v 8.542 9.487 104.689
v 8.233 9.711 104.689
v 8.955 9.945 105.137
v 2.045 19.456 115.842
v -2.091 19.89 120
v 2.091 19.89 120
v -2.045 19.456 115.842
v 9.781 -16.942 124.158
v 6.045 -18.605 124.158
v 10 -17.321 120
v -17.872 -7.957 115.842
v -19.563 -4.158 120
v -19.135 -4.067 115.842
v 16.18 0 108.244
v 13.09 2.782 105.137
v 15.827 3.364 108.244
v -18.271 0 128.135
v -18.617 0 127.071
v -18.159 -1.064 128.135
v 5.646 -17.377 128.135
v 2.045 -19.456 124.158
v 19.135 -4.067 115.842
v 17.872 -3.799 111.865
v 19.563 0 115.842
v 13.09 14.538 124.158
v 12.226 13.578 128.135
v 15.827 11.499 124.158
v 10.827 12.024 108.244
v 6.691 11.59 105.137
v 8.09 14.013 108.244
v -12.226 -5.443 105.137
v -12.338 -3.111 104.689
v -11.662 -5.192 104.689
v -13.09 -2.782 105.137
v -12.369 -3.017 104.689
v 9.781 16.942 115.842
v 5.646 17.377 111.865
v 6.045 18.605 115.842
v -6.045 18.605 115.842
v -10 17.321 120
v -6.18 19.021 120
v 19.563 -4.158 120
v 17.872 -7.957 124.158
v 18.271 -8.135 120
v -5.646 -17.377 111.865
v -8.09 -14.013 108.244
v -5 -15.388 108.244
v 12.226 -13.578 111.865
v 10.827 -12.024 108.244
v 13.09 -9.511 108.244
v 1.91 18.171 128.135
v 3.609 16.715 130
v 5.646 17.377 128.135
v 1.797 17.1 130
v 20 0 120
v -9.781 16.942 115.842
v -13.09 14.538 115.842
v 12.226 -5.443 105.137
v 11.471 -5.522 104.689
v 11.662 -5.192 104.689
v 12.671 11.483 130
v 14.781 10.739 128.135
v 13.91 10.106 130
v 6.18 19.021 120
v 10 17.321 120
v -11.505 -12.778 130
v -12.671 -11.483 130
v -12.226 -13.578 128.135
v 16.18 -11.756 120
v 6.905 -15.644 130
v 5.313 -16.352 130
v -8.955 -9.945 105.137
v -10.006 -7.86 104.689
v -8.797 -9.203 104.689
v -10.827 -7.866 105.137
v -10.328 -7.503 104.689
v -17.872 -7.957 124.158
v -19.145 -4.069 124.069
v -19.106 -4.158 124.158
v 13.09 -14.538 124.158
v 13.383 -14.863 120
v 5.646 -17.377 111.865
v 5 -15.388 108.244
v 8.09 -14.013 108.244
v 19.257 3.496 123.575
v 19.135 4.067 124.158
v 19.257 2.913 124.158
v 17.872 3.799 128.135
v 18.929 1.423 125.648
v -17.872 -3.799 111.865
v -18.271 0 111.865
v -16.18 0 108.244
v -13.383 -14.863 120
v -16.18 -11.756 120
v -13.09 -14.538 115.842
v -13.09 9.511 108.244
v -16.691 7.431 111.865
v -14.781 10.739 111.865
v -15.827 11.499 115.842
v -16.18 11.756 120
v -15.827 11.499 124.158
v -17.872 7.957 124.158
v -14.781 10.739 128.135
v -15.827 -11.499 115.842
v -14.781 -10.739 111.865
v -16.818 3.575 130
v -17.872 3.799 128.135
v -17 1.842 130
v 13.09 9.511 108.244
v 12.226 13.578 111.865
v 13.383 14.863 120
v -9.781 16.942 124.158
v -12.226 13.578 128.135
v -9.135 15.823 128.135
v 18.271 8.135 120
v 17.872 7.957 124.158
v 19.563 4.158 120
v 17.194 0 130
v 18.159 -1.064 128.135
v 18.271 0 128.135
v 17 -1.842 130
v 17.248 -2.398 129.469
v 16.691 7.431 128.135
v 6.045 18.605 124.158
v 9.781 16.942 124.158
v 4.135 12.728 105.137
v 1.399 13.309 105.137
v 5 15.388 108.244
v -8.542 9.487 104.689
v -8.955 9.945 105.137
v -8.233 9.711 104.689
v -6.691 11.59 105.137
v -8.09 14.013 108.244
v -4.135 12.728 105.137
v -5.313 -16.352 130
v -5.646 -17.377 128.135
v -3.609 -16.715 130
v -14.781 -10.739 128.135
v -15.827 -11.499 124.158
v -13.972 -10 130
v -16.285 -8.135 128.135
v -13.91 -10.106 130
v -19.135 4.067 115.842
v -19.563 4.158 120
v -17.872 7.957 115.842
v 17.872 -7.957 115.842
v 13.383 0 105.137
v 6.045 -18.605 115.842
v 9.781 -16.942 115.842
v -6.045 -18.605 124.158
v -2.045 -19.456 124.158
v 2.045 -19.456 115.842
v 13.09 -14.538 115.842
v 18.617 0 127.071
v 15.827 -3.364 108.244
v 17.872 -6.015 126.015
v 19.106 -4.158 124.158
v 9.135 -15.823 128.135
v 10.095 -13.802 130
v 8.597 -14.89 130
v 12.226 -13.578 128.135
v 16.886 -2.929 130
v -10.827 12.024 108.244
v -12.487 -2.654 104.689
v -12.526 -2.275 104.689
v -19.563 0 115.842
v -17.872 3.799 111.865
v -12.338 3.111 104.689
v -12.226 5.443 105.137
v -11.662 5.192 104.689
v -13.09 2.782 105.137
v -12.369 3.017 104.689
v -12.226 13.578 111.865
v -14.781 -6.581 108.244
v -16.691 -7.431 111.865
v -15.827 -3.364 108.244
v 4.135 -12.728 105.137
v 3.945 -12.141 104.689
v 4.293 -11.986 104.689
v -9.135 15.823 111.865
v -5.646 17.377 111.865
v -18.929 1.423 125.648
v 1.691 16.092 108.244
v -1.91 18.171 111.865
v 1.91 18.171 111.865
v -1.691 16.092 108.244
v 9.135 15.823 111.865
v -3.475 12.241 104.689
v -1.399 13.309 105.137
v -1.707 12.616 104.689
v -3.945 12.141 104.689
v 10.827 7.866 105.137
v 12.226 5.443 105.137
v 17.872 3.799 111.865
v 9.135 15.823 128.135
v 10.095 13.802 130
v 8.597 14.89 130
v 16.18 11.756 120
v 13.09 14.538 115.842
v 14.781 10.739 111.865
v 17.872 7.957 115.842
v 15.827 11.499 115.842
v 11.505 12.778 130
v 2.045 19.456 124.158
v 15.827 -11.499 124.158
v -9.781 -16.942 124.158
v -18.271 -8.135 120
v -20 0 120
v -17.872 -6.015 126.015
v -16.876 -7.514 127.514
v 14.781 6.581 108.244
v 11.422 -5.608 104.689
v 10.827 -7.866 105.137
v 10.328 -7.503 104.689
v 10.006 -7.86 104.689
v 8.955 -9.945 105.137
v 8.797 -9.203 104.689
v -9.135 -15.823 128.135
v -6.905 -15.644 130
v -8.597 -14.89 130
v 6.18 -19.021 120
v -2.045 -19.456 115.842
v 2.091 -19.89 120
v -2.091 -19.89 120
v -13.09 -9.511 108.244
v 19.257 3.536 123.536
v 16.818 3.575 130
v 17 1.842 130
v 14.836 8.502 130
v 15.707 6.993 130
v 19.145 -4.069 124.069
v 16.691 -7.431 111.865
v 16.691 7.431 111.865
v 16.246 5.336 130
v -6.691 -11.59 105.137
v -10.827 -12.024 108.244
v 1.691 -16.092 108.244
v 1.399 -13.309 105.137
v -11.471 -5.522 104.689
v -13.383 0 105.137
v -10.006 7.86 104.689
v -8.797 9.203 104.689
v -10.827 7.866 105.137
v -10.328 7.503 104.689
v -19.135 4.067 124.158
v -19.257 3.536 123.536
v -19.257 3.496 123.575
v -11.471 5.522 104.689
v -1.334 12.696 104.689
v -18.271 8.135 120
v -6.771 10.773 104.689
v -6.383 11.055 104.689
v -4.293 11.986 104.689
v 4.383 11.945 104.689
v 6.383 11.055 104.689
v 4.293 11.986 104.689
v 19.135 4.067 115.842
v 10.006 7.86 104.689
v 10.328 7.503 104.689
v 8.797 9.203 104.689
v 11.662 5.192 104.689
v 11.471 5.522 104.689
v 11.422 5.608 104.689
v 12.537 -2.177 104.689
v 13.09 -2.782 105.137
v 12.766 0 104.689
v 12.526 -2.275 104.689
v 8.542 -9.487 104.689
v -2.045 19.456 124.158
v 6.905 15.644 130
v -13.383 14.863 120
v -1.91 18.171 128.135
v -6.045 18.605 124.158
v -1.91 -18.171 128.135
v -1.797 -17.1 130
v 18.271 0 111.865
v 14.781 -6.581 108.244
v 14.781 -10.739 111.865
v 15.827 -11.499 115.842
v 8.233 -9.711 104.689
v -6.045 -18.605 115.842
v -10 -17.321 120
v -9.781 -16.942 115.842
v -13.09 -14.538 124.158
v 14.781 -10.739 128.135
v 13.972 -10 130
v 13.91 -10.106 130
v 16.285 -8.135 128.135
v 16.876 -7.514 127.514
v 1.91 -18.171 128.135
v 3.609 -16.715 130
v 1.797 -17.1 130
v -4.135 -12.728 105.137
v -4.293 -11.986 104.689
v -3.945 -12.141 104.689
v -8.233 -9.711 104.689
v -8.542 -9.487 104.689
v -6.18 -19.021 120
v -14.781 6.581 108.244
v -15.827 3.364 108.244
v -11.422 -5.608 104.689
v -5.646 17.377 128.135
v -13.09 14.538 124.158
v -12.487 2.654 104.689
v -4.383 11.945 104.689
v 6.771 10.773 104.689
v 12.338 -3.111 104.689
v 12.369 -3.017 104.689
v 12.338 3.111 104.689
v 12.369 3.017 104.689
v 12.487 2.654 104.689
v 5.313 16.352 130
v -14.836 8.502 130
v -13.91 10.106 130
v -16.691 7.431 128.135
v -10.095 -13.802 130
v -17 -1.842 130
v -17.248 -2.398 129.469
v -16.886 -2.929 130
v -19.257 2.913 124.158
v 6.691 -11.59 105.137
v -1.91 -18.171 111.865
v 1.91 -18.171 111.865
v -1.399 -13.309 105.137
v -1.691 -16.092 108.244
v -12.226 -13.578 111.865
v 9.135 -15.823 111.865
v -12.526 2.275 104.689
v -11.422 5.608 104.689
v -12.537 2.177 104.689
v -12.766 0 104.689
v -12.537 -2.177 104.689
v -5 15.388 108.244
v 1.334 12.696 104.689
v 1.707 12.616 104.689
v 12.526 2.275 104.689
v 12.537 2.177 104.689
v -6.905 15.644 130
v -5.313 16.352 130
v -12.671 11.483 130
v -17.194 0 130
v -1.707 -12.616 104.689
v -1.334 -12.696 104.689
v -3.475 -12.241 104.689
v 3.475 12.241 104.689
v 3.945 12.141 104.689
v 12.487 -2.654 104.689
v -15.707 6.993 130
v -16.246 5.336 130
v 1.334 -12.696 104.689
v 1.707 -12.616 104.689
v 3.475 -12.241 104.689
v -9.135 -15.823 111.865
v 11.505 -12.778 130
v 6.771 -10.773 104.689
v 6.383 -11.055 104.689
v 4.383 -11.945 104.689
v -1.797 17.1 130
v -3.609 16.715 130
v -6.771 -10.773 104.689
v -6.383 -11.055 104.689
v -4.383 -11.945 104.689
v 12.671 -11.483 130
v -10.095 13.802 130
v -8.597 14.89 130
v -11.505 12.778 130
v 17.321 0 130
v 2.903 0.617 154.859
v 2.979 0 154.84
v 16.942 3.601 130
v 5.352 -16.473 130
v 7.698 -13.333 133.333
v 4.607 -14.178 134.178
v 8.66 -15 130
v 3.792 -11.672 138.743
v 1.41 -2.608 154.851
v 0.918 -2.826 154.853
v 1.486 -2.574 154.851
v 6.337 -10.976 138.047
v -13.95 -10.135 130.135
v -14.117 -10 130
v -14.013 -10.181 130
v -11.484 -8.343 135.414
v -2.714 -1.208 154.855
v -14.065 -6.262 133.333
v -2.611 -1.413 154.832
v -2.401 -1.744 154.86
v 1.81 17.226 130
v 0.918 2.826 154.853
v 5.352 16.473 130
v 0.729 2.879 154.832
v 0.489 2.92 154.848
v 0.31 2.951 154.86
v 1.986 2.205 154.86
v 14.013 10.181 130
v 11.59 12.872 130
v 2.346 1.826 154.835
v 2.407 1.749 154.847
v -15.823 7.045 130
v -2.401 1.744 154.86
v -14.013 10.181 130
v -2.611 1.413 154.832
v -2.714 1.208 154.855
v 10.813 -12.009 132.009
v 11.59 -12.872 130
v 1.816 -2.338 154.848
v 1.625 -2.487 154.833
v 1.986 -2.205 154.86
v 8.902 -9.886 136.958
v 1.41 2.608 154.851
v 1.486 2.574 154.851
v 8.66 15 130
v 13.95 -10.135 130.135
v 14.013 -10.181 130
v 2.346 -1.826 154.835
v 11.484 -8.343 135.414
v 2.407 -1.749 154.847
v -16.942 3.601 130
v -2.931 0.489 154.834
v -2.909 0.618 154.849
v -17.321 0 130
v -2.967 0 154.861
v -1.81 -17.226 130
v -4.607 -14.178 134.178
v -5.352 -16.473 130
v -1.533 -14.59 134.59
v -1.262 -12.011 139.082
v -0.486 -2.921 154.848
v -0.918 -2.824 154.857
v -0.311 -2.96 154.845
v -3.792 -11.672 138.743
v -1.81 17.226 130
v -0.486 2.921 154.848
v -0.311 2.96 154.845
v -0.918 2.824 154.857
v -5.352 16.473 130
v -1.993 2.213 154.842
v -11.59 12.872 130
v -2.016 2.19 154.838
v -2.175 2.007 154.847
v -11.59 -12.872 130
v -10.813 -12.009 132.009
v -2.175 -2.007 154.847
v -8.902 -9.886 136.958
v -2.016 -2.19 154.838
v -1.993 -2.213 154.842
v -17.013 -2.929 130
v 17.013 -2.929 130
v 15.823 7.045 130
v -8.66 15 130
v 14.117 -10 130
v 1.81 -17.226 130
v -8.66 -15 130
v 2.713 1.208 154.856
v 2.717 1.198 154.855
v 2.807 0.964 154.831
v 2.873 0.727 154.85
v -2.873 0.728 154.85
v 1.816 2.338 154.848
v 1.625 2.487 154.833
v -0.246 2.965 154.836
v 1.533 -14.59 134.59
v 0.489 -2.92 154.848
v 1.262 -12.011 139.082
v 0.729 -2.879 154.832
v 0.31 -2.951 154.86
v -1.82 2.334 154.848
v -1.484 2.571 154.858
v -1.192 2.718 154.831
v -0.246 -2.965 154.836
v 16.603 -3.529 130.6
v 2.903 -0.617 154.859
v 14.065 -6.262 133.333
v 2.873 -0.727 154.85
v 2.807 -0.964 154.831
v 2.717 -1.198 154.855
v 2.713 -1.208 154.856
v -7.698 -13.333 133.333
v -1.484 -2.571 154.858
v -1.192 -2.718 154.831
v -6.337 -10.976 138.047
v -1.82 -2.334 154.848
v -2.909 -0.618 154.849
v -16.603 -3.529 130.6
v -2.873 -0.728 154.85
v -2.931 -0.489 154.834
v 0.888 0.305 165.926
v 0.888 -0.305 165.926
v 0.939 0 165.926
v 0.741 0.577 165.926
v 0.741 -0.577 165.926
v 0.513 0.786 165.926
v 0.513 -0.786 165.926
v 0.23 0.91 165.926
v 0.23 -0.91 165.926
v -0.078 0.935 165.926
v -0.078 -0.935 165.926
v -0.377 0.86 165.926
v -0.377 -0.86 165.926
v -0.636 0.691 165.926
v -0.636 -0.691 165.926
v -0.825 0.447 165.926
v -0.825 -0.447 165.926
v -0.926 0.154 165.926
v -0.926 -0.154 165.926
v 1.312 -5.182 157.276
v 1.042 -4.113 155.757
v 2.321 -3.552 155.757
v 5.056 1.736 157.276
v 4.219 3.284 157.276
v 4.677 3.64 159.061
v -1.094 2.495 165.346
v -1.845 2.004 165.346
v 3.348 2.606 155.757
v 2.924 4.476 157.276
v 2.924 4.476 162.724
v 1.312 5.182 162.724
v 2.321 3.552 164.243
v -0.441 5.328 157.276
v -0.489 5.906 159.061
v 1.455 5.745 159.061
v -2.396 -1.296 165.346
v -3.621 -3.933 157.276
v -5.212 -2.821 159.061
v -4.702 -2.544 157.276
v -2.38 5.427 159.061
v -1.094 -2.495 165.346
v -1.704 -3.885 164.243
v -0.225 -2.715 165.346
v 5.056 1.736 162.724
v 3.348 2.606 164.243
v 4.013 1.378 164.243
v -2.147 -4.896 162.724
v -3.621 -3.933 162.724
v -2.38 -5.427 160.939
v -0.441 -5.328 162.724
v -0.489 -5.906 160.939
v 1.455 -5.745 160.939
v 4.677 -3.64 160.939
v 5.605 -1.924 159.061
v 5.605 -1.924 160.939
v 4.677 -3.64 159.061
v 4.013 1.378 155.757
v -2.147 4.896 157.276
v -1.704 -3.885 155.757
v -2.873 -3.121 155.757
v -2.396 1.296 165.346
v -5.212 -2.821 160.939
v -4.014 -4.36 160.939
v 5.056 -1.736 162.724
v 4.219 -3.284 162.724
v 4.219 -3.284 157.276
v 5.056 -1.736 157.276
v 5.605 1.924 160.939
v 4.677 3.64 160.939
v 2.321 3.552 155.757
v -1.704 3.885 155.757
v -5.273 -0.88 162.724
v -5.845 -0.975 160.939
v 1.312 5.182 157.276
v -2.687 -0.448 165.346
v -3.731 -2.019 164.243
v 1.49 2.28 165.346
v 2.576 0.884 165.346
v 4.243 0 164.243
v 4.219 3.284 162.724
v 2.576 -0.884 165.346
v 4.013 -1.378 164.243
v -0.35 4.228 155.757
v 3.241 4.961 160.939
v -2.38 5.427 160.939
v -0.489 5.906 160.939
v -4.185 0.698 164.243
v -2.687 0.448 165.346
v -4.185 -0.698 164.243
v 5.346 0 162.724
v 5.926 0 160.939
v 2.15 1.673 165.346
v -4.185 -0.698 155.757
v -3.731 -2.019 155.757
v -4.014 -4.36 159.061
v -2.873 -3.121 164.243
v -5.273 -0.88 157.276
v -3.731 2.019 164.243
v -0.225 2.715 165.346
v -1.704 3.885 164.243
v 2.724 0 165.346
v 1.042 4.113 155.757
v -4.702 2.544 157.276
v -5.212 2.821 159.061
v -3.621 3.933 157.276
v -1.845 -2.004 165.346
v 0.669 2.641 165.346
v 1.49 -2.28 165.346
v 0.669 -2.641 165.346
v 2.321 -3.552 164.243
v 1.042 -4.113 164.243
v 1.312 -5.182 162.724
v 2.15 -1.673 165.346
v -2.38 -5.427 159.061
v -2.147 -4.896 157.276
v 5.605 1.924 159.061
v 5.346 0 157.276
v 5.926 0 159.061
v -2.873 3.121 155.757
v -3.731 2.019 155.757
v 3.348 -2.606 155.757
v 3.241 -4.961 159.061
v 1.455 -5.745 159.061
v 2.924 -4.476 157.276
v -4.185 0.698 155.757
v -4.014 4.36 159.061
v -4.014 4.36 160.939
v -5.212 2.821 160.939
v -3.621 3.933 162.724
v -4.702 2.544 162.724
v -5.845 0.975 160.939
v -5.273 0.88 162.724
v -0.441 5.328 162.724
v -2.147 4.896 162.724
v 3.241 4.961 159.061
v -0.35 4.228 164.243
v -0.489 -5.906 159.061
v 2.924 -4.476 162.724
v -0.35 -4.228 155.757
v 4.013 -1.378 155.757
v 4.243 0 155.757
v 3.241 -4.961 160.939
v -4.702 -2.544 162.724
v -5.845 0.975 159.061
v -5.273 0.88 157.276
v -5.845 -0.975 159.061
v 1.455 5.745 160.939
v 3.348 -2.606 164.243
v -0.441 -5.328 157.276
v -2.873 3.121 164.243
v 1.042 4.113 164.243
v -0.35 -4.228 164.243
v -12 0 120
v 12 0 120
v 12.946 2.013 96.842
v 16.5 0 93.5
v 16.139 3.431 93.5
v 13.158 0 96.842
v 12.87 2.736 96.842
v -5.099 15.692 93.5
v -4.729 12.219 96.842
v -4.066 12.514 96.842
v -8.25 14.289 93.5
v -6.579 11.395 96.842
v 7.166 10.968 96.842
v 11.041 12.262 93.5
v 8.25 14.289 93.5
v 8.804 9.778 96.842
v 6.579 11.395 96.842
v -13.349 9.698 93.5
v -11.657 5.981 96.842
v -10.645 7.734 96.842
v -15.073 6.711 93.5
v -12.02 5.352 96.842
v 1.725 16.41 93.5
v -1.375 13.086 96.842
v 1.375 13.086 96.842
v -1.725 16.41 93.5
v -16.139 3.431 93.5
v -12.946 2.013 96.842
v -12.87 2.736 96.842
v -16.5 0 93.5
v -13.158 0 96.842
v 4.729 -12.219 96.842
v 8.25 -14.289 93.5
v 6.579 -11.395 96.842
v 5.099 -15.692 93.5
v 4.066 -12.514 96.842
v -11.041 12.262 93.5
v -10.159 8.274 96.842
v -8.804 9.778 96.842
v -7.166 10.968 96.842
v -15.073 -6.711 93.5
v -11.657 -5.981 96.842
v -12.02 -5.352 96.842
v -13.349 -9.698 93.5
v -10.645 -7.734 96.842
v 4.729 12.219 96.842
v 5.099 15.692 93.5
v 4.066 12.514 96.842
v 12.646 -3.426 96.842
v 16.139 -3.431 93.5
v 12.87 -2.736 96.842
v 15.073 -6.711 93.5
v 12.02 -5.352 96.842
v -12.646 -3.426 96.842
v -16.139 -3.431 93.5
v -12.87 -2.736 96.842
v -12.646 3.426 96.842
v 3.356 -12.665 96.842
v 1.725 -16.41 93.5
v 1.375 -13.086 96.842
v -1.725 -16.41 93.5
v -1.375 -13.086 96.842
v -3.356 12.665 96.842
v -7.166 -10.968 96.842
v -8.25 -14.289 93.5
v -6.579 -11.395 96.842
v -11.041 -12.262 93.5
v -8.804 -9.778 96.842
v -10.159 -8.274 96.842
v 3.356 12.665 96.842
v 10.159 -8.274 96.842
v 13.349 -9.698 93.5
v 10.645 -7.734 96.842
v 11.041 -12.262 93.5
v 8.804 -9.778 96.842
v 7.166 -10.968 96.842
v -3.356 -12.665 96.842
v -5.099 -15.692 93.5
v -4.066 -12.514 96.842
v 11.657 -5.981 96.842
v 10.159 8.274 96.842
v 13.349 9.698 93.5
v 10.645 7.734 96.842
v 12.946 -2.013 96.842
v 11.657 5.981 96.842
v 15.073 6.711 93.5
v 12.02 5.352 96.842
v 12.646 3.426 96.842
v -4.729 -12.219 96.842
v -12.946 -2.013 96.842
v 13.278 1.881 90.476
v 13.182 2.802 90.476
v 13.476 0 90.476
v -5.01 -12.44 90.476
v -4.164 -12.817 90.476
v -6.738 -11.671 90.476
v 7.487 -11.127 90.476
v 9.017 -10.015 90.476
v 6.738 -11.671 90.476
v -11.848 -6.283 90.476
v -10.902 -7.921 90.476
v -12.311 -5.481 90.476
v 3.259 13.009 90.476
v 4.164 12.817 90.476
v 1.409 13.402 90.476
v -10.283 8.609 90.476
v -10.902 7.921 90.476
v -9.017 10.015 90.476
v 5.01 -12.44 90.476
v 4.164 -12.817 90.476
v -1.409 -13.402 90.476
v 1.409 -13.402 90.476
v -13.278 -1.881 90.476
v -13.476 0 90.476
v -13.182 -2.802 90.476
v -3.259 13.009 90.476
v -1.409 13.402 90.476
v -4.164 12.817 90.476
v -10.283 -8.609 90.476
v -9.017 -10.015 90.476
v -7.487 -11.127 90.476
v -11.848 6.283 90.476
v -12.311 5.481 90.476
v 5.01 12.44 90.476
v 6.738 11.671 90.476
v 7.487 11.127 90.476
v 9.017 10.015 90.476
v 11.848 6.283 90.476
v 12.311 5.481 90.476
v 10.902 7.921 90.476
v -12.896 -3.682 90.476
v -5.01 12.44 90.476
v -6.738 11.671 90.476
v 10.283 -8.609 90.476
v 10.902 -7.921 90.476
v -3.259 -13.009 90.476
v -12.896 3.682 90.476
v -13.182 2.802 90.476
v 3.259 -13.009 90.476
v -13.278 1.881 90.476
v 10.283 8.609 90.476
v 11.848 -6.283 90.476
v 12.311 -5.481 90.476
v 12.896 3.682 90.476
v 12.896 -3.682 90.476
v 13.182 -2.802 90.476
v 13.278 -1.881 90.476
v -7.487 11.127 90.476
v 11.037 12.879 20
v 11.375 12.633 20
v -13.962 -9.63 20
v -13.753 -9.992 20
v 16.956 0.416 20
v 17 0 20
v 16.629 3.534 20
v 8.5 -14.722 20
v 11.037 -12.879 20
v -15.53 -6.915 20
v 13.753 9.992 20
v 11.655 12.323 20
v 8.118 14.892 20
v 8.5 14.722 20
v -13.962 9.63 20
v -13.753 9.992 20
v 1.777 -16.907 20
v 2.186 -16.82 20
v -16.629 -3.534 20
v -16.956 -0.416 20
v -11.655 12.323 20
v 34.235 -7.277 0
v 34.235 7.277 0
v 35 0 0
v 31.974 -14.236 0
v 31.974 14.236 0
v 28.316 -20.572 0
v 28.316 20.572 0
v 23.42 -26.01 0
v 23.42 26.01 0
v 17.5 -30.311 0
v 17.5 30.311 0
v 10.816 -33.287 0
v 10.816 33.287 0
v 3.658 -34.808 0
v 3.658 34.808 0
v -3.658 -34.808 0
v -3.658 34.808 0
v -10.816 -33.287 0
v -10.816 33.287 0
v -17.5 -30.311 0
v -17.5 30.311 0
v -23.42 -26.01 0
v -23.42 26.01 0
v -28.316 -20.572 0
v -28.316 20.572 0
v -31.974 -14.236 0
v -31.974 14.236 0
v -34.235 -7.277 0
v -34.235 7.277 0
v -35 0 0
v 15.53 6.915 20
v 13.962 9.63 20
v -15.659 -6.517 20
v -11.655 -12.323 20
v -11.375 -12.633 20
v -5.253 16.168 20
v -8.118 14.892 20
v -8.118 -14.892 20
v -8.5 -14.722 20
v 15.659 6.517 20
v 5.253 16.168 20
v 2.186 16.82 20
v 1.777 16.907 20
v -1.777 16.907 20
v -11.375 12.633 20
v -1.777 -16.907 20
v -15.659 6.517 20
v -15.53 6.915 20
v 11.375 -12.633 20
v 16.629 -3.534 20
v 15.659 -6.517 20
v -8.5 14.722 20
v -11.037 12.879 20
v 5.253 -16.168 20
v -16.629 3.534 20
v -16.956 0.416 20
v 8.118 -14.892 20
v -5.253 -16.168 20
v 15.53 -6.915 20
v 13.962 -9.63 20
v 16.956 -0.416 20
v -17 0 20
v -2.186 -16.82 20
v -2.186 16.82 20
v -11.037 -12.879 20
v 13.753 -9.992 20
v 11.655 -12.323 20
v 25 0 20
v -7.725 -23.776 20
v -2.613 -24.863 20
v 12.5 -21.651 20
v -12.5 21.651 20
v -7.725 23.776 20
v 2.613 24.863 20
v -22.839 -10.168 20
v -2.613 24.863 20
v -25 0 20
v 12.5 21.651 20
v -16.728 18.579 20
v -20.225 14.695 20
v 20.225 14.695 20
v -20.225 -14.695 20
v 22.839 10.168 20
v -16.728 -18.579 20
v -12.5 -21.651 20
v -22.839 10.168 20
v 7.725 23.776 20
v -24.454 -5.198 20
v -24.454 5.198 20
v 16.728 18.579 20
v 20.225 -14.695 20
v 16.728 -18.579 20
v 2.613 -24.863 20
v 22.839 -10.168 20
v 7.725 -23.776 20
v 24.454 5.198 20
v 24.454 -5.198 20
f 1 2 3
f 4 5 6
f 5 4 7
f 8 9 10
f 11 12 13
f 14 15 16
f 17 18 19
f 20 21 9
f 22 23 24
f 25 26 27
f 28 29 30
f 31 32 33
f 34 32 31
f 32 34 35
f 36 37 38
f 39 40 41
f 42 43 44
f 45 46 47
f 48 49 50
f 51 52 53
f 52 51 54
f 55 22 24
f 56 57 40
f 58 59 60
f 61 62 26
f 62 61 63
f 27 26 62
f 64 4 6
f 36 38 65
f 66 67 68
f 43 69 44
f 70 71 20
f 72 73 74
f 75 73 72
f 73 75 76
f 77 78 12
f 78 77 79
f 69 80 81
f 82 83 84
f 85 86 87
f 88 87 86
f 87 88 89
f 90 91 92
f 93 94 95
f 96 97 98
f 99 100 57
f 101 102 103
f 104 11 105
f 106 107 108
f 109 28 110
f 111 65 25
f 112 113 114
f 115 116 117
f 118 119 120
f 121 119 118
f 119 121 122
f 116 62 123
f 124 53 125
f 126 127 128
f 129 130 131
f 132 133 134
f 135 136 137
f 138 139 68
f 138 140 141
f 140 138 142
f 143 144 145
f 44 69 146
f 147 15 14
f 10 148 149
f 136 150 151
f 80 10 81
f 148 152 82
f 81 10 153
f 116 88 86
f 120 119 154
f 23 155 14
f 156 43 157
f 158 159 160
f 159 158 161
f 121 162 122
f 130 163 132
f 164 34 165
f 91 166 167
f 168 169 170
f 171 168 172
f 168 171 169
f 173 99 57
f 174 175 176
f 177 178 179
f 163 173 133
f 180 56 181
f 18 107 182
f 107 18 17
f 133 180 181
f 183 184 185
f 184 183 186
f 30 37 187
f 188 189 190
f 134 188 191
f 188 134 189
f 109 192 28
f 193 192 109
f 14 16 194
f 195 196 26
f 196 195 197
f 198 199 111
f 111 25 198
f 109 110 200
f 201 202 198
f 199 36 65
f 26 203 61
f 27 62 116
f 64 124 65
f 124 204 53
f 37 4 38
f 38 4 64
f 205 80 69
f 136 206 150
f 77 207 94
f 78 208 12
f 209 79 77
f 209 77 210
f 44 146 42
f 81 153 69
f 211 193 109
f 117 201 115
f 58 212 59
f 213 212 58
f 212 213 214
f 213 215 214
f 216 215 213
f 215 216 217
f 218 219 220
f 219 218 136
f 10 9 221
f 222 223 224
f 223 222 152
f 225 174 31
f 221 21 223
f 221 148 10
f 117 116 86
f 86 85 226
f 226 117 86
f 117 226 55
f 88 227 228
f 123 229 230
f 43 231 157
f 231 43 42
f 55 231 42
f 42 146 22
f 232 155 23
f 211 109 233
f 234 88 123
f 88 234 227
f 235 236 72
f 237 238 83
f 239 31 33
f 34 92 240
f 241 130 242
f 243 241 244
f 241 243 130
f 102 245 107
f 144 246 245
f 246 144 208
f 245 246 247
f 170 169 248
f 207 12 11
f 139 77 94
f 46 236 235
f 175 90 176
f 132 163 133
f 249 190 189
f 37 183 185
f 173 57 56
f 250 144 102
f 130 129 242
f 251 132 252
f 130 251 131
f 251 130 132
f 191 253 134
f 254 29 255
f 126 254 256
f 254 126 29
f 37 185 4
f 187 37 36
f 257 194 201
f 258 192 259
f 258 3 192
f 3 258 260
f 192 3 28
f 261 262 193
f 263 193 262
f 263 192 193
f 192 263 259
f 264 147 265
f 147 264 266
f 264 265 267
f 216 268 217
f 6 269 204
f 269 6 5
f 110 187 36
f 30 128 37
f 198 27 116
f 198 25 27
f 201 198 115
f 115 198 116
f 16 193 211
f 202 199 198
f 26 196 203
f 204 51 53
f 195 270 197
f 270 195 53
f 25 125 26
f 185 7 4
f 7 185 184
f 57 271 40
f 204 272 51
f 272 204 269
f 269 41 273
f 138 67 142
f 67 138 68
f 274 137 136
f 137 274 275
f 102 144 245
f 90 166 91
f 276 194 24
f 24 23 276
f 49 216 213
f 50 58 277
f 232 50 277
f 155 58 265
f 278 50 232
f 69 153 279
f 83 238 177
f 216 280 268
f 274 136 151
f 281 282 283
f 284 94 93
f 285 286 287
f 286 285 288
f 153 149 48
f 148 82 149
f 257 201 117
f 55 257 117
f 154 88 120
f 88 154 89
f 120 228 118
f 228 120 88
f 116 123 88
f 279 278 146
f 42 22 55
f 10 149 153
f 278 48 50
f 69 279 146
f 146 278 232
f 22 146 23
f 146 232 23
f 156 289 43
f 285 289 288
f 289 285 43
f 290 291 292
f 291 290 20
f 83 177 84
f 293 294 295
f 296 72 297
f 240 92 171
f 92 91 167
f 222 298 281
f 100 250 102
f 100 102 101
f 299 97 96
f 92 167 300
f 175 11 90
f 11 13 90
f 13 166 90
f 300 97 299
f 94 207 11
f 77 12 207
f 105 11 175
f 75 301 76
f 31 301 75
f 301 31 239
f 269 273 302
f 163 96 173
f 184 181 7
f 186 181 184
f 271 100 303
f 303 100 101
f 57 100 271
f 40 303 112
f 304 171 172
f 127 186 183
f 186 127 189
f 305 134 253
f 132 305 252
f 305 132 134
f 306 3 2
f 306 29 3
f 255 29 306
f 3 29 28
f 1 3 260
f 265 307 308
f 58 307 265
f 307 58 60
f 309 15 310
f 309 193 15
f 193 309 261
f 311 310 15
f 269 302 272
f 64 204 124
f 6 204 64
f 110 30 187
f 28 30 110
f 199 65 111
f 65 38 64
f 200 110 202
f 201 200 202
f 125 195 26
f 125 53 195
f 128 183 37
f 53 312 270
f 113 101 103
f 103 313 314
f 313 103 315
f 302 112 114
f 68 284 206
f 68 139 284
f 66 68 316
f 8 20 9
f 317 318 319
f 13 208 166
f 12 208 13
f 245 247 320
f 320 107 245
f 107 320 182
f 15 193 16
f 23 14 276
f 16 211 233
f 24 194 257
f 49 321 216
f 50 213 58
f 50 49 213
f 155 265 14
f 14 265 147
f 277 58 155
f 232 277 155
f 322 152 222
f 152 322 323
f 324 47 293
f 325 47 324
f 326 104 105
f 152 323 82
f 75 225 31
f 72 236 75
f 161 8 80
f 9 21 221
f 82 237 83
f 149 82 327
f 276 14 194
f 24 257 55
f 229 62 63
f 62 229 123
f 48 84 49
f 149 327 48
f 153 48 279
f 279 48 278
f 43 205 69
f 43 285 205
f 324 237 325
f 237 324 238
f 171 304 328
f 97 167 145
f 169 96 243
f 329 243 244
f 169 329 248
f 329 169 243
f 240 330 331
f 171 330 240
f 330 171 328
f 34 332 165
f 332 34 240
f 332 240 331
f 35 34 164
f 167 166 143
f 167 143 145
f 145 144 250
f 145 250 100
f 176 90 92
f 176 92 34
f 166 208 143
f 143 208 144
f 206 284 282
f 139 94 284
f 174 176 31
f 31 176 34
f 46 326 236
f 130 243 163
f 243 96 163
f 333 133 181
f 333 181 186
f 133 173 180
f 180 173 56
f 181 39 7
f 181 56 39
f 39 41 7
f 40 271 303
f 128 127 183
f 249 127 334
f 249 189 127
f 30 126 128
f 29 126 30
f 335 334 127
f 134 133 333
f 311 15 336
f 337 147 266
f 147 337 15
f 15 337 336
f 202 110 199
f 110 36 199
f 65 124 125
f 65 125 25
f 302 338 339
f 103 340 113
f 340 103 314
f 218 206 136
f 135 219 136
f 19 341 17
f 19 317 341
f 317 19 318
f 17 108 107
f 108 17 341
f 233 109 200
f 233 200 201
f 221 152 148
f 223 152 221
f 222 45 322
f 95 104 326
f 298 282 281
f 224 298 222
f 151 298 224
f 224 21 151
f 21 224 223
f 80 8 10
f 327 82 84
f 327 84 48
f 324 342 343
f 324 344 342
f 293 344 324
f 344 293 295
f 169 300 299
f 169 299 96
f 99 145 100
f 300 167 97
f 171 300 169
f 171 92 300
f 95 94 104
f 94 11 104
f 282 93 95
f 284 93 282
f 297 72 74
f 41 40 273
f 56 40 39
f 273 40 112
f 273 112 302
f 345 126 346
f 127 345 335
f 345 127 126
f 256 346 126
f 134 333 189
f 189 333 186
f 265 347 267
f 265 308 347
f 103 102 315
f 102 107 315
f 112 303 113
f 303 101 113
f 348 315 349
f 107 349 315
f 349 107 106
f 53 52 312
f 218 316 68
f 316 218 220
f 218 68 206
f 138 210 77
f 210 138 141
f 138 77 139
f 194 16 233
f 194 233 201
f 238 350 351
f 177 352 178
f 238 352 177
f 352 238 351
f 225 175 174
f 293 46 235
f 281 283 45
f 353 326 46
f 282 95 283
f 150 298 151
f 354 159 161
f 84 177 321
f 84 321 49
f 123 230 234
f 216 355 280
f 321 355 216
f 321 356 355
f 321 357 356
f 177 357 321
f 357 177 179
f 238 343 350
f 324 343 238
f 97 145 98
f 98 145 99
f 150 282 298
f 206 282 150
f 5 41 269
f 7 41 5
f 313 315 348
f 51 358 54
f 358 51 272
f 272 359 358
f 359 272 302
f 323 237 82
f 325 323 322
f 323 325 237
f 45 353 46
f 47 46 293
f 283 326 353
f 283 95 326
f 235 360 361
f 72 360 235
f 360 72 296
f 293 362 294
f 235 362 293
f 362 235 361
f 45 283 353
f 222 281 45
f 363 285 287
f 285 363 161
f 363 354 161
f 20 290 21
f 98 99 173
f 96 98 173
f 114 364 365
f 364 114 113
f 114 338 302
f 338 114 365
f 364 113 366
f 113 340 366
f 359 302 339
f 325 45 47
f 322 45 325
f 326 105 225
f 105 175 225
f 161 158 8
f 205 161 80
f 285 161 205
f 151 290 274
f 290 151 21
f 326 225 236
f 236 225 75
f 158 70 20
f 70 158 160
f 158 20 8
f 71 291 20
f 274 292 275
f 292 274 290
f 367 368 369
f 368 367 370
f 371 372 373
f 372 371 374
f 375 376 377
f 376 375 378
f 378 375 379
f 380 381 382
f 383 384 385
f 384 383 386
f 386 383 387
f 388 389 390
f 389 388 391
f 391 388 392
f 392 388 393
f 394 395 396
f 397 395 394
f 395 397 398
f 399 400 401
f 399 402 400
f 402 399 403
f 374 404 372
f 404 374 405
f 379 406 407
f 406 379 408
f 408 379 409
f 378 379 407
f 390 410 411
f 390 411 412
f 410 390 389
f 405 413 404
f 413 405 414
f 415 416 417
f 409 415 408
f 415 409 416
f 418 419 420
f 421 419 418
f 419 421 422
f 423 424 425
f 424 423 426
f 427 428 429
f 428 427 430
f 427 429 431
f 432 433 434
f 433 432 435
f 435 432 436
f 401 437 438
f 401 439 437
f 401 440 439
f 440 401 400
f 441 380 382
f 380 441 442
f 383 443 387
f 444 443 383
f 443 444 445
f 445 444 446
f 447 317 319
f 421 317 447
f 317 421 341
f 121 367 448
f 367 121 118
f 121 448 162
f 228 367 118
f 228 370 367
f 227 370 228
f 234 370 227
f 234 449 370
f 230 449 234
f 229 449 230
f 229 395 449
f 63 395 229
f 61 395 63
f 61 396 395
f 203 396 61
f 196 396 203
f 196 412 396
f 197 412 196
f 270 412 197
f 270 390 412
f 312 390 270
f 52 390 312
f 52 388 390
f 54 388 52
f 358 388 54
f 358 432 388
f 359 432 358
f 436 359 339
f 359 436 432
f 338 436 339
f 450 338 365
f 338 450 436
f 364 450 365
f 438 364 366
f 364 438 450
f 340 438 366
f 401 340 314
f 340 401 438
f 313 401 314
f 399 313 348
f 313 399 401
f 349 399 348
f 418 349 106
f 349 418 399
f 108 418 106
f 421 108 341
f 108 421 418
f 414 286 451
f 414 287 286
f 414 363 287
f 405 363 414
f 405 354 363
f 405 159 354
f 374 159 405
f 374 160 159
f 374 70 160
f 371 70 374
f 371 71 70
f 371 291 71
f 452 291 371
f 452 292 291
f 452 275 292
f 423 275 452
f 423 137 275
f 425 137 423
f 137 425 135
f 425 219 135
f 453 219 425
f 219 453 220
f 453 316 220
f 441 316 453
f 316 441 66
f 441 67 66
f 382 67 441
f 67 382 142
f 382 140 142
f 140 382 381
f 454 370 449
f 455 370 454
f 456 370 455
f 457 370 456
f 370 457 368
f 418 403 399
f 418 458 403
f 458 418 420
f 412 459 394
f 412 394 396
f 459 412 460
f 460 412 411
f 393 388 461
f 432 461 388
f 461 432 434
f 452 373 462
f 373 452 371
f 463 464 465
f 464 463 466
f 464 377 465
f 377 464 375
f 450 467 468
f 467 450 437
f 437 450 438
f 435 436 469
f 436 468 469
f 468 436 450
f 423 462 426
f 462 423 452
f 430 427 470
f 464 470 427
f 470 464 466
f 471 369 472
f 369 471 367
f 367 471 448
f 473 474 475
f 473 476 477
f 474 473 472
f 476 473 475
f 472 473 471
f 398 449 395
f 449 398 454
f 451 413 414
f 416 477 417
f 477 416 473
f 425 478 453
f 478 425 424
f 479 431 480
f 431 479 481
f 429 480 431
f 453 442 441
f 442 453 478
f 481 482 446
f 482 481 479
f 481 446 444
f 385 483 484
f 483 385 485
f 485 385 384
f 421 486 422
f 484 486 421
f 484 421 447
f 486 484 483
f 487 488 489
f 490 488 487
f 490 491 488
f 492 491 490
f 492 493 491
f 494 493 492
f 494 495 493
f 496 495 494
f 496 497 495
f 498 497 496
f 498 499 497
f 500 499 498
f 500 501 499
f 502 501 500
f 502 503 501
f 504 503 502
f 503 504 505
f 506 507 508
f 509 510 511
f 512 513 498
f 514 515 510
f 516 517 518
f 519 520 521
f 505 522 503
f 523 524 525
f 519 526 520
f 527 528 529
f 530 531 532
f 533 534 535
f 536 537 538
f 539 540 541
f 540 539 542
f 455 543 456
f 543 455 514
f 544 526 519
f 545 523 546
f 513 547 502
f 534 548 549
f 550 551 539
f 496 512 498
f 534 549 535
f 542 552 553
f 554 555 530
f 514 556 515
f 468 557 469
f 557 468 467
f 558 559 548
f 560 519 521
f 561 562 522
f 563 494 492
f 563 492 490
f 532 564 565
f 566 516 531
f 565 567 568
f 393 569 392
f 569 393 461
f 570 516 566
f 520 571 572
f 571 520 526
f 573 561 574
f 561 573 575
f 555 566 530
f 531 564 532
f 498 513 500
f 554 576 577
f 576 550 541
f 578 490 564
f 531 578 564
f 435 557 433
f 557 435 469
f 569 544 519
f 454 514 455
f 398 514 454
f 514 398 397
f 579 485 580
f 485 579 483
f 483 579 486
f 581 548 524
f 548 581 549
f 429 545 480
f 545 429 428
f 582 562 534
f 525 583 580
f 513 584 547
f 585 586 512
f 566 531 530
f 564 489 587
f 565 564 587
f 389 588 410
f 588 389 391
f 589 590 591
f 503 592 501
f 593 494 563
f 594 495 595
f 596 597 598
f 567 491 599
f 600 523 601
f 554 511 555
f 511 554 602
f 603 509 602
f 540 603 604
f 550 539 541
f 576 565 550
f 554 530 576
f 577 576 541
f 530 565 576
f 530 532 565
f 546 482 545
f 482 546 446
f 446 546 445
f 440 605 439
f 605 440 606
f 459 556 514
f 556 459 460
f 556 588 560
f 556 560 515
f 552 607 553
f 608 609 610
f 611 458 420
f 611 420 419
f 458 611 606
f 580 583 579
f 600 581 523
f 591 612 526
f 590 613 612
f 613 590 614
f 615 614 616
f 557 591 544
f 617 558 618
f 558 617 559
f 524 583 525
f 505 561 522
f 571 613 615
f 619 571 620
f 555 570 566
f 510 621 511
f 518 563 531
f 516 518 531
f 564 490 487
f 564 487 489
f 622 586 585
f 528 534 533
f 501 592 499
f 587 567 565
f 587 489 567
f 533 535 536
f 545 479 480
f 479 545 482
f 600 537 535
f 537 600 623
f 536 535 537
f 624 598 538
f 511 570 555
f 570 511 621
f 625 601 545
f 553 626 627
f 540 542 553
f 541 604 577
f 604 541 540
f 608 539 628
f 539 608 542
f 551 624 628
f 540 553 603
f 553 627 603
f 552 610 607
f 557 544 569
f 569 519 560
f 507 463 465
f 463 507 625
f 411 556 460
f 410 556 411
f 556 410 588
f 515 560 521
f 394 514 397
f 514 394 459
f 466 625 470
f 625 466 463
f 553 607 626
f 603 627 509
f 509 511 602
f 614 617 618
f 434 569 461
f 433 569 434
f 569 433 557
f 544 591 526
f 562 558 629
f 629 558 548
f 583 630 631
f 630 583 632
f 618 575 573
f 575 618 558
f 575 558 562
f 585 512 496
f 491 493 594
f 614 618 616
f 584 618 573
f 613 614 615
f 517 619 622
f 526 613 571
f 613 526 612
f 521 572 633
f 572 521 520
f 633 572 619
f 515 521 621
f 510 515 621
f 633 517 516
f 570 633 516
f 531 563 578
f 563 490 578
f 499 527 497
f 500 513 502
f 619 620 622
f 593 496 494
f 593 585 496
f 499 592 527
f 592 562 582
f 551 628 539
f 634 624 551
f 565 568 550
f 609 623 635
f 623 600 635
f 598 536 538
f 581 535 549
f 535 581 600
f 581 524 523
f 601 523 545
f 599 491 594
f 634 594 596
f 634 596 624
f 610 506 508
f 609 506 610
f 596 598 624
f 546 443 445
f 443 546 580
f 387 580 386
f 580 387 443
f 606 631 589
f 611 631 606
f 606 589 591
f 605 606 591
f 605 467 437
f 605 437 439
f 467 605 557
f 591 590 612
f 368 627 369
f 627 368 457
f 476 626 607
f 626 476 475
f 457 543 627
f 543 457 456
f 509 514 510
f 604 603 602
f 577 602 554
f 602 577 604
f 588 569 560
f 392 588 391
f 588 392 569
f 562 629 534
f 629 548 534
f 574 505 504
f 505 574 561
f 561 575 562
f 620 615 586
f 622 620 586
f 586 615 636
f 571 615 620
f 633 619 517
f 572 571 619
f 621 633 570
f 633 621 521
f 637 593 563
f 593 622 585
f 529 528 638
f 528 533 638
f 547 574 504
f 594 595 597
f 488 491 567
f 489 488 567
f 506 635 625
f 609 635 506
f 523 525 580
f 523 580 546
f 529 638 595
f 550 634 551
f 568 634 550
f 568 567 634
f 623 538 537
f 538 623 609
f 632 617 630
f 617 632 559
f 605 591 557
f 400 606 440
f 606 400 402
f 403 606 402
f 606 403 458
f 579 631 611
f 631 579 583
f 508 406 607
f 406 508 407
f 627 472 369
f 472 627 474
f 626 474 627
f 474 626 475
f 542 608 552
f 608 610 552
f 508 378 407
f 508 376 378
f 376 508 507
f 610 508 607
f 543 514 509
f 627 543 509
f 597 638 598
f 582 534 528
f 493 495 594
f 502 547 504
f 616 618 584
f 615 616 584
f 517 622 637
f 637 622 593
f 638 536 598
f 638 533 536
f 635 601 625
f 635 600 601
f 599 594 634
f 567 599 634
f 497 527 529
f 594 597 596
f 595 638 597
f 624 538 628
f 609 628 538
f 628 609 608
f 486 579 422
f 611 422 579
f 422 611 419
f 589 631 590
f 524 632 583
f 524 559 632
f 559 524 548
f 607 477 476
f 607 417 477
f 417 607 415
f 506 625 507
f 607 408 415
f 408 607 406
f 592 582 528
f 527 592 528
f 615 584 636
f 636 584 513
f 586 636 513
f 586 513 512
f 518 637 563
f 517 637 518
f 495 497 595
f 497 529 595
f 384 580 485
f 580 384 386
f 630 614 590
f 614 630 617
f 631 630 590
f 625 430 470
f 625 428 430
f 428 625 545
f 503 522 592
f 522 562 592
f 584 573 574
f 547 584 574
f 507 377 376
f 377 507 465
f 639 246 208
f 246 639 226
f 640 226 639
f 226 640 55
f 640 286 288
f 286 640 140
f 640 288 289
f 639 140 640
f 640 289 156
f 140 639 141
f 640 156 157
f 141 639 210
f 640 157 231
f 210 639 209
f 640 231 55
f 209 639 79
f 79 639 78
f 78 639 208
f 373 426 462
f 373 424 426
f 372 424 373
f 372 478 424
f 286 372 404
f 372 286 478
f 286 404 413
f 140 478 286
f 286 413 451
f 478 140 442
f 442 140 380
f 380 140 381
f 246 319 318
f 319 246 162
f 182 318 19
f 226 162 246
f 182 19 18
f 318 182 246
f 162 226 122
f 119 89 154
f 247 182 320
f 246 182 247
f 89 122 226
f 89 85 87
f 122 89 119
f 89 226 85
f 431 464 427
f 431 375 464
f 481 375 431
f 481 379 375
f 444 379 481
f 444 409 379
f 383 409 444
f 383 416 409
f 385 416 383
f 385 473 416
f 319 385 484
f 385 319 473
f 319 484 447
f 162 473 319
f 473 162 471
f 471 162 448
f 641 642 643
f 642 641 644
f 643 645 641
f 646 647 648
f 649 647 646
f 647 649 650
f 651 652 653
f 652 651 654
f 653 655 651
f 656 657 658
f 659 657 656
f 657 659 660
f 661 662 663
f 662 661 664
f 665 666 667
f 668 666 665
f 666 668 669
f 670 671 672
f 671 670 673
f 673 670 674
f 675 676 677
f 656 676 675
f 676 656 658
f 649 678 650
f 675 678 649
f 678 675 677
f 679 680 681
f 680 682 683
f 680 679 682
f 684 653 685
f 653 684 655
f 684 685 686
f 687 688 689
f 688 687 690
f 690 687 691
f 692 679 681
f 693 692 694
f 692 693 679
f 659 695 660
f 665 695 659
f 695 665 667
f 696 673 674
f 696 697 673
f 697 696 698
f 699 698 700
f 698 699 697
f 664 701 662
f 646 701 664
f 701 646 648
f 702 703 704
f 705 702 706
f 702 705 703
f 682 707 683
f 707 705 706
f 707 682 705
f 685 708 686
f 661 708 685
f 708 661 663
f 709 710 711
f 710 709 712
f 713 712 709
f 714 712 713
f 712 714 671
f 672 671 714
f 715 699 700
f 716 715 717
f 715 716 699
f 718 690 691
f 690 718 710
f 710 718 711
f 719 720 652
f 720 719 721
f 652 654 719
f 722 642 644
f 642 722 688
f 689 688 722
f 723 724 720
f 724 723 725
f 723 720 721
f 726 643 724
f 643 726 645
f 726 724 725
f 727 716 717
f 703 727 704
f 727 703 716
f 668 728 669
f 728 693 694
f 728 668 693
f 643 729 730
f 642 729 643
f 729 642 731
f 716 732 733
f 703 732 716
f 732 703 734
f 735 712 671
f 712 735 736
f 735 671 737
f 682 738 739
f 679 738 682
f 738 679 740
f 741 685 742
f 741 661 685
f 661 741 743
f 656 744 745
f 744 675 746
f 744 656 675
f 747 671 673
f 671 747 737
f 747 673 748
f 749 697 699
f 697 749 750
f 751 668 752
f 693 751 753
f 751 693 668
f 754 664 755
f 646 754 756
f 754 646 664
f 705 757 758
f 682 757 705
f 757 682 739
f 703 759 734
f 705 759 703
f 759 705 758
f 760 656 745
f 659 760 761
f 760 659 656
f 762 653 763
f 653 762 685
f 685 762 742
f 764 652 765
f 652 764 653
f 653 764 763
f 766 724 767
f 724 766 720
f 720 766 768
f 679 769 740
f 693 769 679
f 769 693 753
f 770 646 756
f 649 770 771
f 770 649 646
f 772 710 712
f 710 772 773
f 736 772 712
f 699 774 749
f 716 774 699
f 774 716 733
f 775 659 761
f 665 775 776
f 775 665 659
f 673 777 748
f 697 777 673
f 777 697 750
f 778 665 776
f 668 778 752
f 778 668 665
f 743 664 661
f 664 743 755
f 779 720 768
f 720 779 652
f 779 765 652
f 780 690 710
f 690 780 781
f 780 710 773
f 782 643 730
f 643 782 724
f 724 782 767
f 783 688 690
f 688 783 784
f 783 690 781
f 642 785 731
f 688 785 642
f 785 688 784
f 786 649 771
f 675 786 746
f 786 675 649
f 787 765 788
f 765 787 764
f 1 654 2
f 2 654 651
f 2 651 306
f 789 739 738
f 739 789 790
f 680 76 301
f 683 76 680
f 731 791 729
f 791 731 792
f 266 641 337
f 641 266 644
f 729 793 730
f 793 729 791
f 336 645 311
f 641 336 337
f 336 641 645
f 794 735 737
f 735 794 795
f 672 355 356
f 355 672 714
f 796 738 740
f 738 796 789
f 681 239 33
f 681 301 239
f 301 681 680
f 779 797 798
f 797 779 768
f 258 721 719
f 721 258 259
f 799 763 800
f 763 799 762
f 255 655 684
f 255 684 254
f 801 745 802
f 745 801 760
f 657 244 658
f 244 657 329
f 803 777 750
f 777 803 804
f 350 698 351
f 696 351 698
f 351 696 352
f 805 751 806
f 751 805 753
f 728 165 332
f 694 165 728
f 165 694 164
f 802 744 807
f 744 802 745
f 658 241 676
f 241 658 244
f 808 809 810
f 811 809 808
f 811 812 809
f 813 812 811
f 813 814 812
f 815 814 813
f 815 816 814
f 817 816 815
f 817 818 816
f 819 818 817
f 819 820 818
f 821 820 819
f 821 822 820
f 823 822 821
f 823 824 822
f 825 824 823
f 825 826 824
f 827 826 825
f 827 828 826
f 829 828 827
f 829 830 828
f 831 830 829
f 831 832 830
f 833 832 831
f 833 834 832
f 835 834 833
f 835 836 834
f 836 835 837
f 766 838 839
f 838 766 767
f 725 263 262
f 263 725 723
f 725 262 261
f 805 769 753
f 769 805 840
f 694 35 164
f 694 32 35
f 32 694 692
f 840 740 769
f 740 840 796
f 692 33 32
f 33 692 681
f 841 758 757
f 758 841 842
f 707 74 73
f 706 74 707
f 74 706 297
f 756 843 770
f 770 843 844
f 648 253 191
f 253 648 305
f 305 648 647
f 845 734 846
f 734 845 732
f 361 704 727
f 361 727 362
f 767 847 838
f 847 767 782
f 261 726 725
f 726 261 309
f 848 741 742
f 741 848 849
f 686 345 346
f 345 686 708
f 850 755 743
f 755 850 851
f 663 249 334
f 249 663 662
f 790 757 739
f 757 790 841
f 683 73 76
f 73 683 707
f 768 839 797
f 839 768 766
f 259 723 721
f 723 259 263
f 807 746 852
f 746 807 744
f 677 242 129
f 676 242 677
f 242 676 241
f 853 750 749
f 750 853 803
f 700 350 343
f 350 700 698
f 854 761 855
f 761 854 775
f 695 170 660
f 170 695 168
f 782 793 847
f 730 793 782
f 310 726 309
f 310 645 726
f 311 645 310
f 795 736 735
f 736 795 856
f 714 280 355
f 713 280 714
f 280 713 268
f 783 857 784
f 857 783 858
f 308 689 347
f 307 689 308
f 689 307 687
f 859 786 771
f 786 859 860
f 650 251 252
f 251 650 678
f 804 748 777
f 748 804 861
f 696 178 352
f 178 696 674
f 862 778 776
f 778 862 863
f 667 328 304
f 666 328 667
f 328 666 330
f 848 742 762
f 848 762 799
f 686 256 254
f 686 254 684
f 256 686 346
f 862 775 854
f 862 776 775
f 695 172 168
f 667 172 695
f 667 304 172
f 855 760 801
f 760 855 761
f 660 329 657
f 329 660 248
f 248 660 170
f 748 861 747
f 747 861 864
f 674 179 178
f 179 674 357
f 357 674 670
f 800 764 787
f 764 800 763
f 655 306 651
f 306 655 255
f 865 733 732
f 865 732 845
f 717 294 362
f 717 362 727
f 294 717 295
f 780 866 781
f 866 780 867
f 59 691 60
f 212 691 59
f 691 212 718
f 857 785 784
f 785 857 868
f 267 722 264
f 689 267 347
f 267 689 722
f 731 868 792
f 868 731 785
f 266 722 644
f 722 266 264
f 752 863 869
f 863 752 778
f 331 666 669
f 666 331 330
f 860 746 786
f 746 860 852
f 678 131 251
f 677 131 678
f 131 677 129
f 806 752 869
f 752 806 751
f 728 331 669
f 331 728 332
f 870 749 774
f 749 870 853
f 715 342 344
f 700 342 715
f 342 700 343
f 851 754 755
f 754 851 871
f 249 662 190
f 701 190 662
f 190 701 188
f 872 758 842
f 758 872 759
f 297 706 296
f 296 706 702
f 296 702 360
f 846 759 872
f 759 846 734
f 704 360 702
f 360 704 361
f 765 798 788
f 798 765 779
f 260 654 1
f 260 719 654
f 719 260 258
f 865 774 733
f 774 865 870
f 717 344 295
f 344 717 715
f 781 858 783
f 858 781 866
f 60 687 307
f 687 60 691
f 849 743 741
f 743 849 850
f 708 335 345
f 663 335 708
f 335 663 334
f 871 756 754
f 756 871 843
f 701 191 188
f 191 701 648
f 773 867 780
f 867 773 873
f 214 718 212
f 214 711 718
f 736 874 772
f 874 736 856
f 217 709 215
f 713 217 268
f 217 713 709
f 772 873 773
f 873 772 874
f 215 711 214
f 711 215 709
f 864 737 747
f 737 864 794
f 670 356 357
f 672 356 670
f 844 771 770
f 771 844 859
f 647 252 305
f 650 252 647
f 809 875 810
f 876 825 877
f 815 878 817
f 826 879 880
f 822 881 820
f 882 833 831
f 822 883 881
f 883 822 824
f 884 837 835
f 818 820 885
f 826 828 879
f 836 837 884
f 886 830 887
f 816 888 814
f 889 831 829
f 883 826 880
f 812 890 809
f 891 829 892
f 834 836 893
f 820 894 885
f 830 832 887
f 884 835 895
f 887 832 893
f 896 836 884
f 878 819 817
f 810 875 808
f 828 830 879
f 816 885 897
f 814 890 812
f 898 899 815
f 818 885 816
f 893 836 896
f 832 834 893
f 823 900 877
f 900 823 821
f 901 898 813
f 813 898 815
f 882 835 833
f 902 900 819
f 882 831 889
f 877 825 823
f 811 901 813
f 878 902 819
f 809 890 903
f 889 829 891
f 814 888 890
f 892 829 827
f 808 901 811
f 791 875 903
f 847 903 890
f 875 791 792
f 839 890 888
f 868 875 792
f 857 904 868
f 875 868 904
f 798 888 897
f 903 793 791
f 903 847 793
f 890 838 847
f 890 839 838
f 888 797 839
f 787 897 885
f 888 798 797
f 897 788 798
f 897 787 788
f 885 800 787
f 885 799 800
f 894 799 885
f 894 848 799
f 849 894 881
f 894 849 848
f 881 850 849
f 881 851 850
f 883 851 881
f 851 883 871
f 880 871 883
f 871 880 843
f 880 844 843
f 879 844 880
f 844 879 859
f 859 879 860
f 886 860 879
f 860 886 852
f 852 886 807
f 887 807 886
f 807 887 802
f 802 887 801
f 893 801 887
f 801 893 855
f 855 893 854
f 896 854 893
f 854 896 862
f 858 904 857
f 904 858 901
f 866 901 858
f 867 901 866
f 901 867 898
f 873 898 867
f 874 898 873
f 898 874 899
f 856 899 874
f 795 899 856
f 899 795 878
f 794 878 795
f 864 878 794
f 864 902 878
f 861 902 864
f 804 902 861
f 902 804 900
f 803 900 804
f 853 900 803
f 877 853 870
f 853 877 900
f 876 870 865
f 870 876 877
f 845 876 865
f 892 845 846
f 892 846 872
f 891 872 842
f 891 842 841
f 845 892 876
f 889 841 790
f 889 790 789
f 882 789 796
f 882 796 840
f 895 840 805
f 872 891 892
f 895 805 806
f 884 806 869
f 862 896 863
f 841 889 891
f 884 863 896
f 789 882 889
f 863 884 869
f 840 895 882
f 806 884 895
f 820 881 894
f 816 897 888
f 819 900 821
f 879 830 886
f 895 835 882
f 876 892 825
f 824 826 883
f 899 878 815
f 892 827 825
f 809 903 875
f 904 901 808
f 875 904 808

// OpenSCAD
union(){
//head
translate([0,0,120])
difference(){
union() {
    //teardrop
  sphere(r = 20);
    translate([0,0,20*sin(30)])
  cylinder(h = 30, r1 = 20*cos(30), r2 = 0);
    //dollop
    translate([0,0,30+20*sin(30)])
    sphere(r=6);
}
rotate([45,0,0])
translate([-20,0,0])
cube([40,5,40]);}
//neck
cylinder(h=120,r1=18,r2=12);
//base
cylinder(h=20,r1=35,r2=25);
//collar
translate([0,0,90])
intersection(){
cylinder(h=20,r1=20,r2=0);
translate([0,0,7])
mirror([0,0,1])
cylinder(h=20,r1=20,r2=0);

}
}
